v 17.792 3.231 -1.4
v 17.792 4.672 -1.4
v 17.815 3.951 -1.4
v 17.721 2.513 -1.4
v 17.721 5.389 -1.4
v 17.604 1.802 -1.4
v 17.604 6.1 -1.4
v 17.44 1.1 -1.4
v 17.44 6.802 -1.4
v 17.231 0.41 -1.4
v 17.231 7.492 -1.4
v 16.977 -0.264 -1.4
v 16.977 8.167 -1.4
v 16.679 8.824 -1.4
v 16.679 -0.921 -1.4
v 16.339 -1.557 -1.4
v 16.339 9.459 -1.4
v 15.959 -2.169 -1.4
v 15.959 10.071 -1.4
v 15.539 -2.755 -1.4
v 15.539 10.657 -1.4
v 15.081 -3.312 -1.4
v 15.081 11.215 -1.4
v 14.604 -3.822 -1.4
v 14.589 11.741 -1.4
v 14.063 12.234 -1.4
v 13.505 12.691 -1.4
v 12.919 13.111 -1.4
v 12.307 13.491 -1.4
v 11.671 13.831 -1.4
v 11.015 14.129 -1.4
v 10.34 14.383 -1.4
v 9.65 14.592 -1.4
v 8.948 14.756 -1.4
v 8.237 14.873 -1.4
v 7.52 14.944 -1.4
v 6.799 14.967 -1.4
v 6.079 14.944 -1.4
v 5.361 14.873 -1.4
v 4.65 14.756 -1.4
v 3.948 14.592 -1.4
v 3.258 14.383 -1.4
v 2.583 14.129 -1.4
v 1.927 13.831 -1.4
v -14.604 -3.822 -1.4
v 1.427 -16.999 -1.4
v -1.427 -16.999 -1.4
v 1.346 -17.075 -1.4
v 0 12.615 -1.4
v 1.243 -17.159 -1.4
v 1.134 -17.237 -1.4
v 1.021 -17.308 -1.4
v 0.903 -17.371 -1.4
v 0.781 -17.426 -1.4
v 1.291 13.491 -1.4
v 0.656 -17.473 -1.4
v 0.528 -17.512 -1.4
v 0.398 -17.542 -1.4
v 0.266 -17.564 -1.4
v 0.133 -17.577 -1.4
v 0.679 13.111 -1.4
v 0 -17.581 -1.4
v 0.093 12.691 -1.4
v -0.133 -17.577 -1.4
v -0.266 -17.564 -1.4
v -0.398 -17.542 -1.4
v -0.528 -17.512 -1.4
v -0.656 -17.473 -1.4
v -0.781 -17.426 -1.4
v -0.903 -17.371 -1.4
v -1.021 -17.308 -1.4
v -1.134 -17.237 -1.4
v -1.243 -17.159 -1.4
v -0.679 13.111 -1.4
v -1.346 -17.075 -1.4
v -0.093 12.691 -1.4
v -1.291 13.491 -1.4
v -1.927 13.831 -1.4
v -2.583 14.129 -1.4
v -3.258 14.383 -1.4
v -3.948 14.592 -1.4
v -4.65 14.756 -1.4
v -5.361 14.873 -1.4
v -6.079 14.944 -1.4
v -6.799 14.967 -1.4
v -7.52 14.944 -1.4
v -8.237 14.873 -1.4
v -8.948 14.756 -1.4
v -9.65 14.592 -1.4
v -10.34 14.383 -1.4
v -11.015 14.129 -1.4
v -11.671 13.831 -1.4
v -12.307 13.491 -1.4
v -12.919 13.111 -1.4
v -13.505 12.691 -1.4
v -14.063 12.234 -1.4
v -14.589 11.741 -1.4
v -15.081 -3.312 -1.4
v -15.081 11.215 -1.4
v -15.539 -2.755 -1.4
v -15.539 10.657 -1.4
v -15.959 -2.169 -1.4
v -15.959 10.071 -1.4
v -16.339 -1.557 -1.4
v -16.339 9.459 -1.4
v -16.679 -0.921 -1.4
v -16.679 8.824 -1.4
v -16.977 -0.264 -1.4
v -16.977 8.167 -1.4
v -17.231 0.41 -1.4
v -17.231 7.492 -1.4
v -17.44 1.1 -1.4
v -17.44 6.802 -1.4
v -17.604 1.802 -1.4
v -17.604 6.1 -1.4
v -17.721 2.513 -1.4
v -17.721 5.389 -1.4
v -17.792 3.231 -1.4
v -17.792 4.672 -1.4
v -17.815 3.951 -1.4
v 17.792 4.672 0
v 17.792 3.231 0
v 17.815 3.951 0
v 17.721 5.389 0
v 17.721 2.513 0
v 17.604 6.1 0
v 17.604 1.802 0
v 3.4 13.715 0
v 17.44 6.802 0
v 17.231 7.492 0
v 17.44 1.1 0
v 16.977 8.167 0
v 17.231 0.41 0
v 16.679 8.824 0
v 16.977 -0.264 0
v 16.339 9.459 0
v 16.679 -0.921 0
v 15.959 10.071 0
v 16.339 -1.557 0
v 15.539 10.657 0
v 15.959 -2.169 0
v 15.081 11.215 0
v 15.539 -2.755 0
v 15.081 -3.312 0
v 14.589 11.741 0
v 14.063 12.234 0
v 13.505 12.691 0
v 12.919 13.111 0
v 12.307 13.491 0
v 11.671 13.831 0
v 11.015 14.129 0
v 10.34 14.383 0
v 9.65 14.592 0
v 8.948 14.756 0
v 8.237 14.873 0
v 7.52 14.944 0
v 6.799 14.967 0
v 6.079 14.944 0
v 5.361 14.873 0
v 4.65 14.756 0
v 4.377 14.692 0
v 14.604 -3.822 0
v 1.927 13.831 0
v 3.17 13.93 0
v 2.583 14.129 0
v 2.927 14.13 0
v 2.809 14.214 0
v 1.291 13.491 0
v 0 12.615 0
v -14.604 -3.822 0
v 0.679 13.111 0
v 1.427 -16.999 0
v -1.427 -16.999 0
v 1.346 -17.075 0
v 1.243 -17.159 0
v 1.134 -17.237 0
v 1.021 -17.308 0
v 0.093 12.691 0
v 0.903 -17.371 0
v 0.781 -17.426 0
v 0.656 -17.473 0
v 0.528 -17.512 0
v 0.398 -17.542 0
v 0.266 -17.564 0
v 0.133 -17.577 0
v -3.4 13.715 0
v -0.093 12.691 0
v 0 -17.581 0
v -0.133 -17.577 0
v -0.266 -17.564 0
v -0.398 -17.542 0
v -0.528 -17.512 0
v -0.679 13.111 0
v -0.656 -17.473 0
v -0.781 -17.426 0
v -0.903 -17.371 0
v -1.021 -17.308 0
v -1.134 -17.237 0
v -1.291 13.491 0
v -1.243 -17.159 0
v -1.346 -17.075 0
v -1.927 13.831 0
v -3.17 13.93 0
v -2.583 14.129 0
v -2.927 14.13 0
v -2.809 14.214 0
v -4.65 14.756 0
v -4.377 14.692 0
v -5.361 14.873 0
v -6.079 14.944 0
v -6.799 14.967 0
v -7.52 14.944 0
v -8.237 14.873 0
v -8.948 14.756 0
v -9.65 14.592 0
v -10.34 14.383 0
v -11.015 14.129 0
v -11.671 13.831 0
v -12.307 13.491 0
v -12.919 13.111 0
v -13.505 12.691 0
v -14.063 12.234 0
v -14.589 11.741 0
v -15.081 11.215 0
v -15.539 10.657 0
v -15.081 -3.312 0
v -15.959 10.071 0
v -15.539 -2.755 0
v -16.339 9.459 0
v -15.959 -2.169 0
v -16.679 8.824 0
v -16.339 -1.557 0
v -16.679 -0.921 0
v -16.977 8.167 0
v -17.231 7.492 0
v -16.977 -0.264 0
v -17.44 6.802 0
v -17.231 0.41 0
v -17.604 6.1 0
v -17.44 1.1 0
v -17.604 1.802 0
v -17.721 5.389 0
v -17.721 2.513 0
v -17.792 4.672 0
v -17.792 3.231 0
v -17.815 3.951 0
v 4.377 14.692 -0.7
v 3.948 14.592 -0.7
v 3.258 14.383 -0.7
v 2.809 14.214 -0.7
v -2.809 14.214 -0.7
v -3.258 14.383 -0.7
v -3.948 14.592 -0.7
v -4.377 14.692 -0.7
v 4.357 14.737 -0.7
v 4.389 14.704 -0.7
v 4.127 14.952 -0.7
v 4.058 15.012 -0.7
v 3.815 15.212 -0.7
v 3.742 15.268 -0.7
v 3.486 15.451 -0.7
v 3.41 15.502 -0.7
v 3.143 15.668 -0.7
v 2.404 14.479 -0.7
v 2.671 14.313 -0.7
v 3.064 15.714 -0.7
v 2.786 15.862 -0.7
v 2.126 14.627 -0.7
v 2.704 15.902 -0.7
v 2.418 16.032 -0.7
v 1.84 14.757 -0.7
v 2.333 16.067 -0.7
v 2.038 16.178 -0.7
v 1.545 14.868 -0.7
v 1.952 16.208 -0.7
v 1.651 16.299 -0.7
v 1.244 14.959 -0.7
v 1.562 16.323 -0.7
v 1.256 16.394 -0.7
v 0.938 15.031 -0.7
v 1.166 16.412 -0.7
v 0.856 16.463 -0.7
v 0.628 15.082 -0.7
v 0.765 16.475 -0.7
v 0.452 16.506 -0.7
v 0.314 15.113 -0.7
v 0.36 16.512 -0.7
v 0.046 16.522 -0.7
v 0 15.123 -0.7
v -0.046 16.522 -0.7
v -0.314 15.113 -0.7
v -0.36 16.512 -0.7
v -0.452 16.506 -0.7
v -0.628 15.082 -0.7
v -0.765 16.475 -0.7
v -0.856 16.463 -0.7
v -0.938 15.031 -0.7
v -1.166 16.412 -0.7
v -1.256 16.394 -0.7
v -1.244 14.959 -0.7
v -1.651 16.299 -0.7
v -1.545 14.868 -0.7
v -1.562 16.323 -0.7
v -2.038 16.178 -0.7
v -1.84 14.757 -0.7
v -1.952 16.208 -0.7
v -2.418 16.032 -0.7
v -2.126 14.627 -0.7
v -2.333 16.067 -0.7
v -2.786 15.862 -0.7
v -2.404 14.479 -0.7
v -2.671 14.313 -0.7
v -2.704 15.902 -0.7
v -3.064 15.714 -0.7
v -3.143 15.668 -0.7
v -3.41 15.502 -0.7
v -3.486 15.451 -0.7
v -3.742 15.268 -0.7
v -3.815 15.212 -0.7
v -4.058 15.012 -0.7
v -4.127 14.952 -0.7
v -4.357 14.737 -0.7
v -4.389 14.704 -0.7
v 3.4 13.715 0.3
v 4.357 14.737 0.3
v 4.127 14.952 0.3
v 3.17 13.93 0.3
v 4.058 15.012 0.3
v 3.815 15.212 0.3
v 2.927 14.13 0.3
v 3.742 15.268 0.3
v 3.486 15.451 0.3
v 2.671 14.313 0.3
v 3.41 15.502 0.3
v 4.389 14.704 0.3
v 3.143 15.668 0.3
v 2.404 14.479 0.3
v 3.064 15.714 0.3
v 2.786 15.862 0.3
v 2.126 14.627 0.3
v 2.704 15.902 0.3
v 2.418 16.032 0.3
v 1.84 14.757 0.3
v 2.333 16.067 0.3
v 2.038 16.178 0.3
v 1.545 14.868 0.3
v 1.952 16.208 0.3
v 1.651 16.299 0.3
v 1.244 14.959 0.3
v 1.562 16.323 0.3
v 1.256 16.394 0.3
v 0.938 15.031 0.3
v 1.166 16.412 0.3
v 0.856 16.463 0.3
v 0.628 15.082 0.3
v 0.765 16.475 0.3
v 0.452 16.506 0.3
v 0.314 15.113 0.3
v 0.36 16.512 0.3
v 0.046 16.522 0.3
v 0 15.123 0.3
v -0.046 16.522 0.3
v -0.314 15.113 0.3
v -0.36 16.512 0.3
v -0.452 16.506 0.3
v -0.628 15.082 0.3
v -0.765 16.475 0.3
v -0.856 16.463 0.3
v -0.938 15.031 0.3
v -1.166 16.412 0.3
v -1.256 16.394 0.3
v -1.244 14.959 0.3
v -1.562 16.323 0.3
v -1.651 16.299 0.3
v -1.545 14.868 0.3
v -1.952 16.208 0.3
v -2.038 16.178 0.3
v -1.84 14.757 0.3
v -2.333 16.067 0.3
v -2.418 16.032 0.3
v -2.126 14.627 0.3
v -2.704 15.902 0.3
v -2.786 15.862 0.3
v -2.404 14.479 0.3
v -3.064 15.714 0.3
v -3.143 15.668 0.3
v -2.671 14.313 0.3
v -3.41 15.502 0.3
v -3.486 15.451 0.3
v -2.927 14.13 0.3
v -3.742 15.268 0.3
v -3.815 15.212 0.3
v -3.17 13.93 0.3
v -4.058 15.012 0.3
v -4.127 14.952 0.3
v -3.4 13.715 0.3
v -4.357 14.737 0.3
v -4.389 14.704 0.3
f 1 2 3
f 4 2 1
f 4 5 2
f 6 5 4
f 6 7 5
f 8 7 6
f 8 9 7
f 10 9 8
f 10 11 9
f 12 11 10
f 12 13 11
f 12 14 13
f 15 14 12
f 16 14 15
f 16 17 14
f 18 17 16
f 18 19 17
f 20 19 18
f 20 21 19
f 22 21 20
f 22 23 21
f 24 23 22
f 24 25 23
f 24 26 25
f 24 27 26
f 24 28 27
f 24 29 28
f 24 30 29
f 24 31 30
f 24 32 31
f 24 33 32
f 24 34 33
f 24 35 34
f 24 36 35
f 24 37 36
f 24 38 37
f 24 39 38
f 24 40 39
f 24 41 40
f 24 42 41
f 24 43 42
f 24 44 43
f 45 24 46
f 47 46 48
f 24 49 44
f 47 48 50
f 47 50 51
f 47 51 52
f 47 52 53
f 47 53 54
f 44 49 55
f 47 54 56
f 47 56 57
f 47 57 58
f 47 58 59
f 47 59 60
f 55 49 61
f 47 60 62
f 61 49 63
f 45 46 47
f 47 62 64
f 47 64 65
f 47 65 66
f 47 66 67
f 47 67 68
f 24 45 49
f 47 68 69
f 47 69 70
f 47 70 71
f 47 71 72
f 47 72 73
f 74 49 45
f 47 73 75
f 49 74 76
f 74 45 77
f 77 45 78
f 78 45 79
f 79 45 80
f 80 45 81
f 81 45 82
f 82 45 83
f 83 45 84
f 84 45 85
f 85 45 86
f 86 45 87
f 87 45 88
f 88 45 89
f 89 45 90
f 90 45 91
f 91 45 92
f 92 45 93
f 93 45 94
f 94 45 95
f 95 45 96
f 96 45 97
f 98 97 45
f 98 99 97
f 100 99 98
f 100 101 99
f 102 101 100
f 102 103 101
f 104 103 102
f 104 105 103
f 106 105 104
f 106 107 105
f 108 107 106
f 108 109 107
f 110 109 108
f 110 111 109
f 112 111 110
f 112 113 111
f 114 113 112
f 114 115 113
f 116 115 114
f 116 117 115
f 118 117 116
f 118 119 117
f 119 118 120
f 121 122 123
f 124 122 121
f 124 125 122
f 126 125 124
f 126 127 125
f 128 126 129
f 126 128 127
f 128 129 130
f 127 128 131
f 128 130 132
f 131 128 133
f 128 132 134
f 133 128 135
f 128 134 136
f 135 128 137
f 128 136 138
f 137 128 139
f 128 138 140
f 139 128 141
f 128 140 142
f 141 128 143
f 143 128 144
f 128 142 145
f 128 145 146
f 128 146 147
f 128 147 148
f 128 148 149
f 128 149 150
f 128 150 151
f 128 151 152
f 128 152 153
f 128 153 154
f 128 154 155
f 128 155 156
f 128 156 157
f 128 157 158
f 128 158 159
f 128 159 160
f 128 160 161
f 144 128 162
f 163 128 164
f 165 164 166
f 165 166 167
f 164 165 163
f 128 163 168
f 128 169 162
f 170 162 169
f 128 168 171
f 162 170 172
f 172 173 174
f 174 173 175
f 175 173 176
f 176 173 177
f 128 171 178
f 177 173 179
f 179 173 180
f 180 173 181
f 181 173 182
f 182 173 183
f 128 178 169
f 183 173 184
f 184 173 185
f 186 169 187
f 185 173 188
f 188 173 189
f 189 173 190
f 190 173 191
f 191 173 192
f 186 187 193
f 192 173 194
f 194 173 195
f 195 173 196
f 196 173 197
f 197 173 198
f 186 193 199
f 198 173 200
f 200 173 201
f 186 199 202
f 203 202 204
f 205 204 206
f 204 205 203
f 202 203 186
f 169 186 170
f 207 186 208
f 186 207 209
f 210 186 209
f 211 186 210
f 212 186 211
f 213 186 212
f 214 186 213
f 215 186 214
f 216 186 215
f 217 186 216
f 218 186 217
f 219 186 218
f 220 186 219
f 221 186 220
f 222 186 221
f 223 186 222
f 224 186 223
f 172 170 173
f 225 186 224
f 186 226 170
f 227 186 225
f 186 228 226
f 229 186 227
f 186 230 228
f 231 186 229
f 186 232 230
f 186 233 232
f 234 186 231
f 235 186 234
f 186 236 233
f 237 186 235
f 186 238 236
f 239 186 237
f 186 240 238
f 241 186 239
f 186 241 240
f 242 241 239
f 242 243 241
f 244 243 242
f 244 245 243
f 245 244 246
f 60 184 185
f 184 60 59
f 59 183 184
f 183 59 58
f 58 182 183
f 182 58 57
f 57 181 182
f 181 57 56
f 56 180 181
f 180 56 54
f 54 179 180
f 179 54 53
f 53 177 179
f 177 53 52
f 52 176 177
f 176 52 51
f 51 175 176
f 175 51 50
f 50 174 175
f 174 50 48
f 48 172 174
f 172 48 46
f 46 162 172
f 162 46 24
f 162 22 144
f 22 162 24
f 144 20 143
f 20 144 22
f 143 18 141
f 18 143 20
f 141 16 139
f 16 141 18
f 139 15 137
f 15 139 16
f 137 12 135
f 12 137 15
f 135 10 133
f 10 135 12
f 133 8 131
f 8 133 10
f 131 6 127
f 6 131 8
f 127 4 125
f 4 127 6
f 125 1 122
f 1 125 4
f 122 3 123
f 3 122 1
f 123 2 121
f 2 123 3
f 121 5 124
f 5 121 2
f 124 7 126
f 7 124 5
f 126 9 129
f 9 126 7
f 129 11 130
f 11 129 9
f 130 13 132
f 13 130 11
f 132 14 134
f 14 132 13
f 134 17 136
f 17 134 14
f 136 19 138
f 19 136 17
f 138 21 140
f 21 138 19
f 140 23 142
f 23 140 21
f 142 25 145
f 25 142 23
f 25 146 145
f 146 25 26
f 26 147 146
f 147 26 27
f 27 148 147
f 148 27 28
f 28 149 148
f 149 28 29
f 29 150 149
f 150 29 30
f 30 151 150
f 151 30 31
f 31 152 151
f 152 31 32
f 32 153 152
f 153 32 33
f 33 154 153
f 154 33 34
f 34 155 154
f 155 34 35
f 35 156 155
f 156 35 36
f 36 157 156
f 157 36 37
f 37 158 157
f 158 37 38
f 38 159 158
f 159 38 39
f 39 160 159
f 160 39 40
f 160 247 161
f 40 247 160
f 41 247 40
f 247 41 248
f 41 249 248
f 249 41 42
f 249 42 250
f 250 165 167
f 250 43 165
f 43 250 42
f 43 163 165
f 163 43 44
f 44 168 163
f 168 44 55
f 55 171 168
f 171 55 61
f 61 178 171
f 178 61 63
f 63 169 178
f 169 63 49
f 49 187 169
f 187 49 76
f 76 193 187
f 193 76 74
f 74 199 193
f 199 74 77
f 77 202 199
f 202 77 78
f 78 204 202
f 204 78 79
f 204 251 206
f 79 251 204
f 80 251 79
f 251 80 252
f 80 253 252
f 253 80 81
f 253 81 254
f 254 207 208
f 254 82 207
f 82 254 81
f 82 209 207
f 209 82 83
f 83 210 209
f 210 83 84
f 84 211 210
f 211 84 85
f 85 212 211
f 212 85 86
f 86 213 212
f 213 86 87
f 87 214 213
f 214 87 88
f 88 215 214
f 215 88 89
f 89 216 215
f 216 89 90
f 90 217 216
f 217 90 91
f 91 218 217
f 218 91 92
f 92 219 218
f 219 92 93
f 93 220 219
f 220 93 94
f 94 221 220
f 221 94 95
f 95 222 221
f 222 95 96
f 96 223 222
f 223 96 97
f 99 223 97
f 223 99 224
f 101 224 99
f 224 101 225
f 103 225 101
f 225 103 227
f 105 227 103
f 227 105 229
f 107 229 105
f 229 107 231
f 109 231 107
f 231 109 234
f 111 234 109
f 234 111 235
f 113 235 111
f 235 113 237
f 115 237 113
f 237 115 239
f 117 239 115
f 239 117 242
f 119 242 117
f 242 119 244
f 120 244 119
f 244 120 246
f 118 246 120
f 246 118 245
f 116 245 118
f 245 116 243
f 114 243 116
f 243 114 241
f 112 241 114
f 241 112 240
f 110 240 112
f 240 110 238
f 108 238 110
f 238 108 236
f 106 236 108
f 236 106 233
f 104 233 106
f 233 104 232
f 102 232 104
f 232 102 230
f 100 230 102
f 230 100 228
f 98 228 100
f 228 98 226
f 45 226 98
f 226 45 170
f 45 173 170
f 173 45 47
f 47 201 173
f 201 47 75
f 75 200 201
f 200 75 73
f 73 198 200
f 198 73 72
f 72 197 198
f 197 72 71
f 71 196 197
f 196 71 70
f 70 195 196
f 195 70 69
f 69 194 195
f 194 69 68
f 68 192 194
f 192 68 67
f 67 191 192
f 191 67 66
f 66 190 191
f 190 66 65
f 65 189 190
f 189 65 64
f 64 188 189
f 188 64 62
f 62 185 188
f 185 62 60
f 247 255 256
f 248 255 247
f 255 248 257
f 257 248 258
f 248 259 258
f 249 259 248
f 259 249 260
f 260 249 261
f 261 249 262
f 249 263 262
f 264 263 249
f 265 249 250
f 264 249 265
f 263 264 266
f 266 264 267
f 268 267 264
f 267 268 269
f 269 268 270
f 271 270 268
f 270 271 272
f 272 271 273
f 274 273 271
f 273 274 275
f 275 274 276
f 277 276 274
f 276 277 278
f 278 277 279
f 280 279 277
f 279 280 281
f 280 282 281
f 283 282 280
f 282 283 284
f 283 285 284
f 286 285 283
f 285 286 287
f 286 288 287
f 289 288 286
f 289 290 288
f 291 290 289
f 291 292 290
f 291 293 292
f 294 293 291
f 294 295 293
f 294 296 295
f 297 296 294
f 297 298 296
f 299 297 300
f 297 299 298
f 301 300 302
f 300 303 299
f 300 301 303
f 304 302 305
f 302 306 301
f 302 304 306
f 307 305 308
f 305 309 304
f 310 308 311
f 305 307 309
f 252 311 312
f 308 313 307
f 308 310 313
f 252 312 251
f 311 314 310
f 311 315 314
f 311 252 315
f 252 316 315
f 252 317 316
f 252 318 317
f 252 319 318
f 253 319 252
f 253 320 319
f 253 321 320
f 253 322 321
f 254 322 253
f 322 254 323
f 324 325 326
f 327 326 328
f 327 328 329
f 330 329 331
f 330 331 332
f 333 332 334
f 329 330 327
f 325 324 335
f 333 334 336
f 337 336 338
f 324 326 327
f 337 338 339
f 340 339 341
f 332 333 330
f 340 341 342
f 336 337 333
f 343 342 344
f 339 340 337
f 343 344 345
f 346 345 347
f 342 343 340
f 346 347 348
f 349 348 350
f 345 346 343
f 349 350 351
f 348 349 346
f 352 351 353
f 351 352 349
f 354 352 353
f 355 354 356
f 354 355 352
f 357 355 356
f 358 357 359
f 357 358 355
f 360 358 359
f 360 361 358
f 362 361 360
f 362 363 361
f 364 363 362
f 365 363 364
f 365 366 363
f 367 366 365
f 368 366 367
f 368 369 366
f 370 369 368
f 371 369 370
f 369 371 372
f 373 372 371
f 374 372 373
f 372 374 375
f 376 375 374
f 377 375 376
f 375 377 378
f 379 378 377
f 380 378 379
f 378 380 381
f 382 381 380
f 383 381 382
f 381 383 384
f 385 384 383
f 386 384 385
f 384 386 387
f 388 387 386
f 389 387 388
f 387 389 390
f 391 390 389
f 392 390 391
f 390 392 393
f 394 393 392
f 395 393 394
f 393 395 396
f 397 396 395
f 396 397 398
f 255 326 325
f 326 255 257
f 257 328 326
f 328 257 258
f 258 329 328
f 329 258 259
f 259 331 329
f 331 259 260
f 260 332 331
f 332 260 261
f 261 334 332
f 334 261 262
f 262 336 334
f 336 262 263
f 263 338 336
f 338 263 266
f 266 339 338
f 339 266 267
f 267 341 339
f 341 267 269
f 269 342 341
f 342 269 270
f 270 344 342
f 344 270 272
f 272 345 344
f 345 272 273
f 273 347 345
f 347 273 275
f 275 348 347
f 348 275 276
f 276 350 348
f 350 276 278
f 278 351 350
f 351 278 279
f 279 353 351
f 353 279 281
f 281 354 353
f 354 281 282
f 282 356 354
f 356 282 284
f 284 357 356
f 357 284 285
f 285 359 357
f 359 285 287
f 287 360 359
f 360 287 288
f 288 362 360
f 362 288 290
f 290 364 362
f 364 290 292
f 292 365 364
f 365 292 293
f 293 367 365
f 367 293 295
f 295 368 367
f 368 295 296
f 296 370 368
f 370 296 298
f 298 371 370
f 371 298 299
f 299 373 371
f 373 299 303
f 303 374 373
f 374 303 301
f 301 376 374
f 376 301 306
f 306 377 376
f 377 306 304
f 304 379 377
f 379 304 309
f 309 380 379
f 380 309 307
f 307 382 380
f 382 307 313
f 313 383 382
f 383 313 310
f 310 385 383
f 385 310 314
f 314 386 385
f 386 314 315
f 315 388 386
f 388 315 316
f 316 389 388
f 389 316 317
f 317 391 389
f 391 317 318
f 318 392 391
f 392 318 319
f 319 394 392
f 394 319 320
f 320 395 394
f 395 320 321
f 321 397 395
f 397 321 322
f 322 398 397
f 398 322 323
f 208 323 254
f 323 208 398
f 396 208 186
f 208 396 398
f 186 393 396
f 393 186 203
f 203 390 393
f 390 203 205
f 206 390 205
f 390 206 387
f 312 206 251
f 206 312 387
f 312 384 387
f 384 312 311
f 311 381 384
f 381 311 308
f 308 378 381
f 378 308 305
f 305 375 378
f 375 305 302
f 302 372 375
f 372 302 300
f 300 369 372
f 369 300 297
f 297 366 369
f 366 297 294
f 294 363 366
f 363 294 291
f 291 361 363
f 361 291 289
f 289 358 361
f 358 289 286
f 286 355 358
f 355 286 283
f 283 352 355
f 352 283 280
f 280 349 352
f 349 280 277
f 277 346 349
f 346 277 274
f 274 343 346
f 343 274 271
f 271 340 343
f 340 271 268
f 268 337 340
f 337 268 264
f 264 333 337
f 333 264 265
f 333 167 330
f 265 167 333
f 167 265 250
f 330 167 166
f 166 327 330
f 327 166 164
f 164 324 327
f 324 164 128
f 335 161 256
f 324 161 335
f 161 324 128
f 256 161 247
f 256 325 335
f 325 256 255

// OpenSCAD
// file: random_maze_generator.scad
use <2d.scad>;

rows = 10; 
columns = 10; 
wall_thickness = 2;
wall_height = 5;
block_width = 5;
bottom = YES;


/*
 * constants, for clearness
 *
 */
 
// random directions, for picking up a direction to visit the next block
function PERMUTATION_OF_FOUR() = [
    [1, 2, 3, 4],
    [1, 2, 4, 3],
    [1, 3, 2, 4],
    [1, 3, 4, 2],
    [1, 4, 2, 3],
    [1, 4, 3, 2],
    [2, 1, 3, 4],
    [2, 1, 4, 3],
    [2, 3, 1, 4],
    [2, 3, 4, 1],
    [2, 4, 1, 3],
    [2, 4, 3, 1],
    [3, 1, 2, 4],
    [3, 1, 4, 2],
    [3, 2, 1, 4],
    [3, 2, 4, 1],
    [3, 4, 1, 2],
    [3, 4, 2, 1],
    [4, 1, 2, 3],
    [4, 1, 3, 2],
    [4, 2, 1, 3],
    [4, 2, 3, 1],
    [4, 3, 1, 2],
    [4, 3, 2, 1]
];

function NO_WALL() = 0;
function UP_WALL() = 1;
function RIGHT_WALL() = 2;
function UP_RIGHT_WALL() = 3;

function NOT_VISITED() = 0;
function VISITED() = 1;

/* 
 * modules for creating a maze
 *
 */

// create the outer wall of maze
module maze_outer_wall(rows, columns, block_width = 5, wall_thickness = 1) {
    x_line([0, rows * block_width], columns * block_width, wall_thickness);
    y_line([0, block_width], (rows - 1) * block_width, wall_thickness);
}

// create the inner wall of maze
module maze_inner_wall(maze, block_width = 5, wall_thickness = 1) {
    for(i = [0:len(maze) - 1]) {
        cord = maze[i];
        x = (cord[0] - 1) * block_width;
        y = (cord[1] - 1) * block_width;
        v = cord[3];
        
        if(v == 1 || v == 3) {
            x_line([x, y], block_width, wall_thickness);
        }
        if(v == 2 || v == 3) {
            y_line([x + block_width, y], block_width, wall_thickness);
        }
    }  
}

// create a maze
module maze(rows, columns, maze_vector, block_width = 5, wall_thickness = 1) {
     maze_outer_wall(rows, columns, block_width, wall_thickness);
     maze_inner_wall(maze_vector, block_width, wall_thickness);
}

/* 
 * utilities functions
 *
 */

// comare the equality of [x1, y1] and [x2, y2]
function cord_equals(cord1, cord2) = cord1 == cord2;

// is the point visited?
function not_visited(cord, vs, index = 0) =
    index == len(vs) ? true : 
        (cord_equals([vs[index][0], vs[index][1]], cord) && vs[index][2] == 1 ? false :
            not_visited(cord, vs, index + 1));
            
// pick a direction randomly
function rand_dirs() =
    PERMUTATION_OF_FOUR()[round(rands(0, 24, 1)[0])]; 

// give a index (exclusivly), slice a vector 
function head_to(i, vs) =
    i >= len(vs) ? vs : (
        i == 0 ? [] : concat(head_to(i - 1, vs), [vs[i - 1]])
    );

// give a index (exclusivly), slice a vector 
function tail_from(i, vs, index = 0, new_vs = []) =
    i >= len(vs) ? [] : (
        index < i ? tail_from(i, vs, index + 1) : (
            index < len(vs) ? tail_from(i, vs, index + 1, concat(new_vs, [vs[index]])) : new_vs
        )
    );

// replace v1 in the vector with v2 
function replace(v1, v2, vs, index = 0) =
    index == len(vs) ? vs : (
        vs[index] == v1 ? concat(concat(head_to(index, vs), [v2]), tail_from(index + 1, vs)) : replace(v1, v2, vs, index + 1)
    );
    
/* 
 * functions for generating a maze vector
 *
 */

// initialize rows of a maze
function init_row(n, length) =
    length == 0 ? [] : concat(init_row(n, length - 1), [[length, n, 0, UP_RIGHT_WALL()]]);
    
// initialize a maze
function init_maze(rows, columns) =
    rows == 0 ? [] : concat(init_maze(rows - 1, columns), init_row(rows, columns));
    
// find a vector in the maze vector
function find(i, j, maze_vector, index = 0) =
    index == len(maze_vector) ? [] : (
        cord_equals([i, j], [maze_vector[index][0], maze_vector[index][1]]) ? maze_vector[index] : find(i, j, maze_vector, index + 1)
    );

////
// NO_WALL = 0;
// UP_WALL = 1;
// RIGHT_WALL = 2;
// UP_RIGHT_WALL = 3;
function delete_right_wall(original_block) = 
    original_block == NO_WALL() || original_block == RIGHT_WALL() ? NO_WALL() : UP_WALL();

function delete_up_wall(original_block) = 
    (original_block == NO_WALL() || original_block == UP_WALL()) ? NO_WALL() : RIGHT_WALL();
    
function delete_right_wall_of(vs, is_visited, maze_vector) =
    replace(vs, [vs[0], vs[1] , is_visited, delete_right_wall(vs[3])] ,maze_vector);

function delete_up_wall_of(vs, is_visited, maze_vector) =
    replace(vs, [vs[0], vs[1] , is_visited, delete_up_wall(vs[3])] ,maze_vector);

function go_right(i, j, rows, columns, maze_vector) =
    go_maze(i + 1, j, rows, columns, delete_right_wall_of(find(i, j, maze_vector), VISITED(), maze_vector));
    
function go_up(i, j, rows, columns, maze_vector) =
    go_maze(i, j - 1, rows, columns, delete_up_wall_of(find(i, j, maze_vector), VISITED(), maze_vector));
    
function visit(v, maze_vector) =
    replace(v, [v[0], v[1], VISITED(), v[3]], maze_vector);
 
function go_left(i, j, rows, columns, maze_vector) =
    go_maze(i - 1, j, rows, columns, delete_right_wall_of(find(i - 1, j, maze_vector), NOT_VISITED(), maze_vector));
    
function go_down(i, j, rows, columns, maze_vector) =
    go_maze(i, j + 1, rows, columns, delete_up_wall_of(find(i, j + 1, maze_vector), NOT_VISITED(), maze_vector));
    
function go_maze(i, j, rows, columns, maze_vector) =
    look_around(i, j, rand_dirs(), rows, columns, visit(find(i, j, maze_vector), maze_vector));
    
function look_around(i, j, dirs, rows, columns, maze_vector, index = 0) =
    index == 4 ? maze_vector : 
        look_around( 
            i, j, dirs, 
            rows, columns, 
            build_wall(i, j, dirs[index], rows, columns, maze_vector), 
            index + 1
        ); 

function build_wall(i, j, n, rows, columns, maze_vector) = 
    n == 1 && i != columns && not_visited([i + 1, j], maze_vector) ? go_right(i, j, rows, columns, maze_vector) : ( 
        n == 2 && j != 1 && not_visited([i, j - 1], maze_vector) ? go_up(i, j, rows, columns, maze_vector)  : (
            n == 3 && i != 1 && not_visited([i - 1, j], maze_vector) ? go_left(i, j,rows, columns,  maze_vector)  : (
                n == 4 && j != rows && not_visited([i, j + 1], maze_vector) ? go_down(i, j, rows, columns, maze_vector) : maze_vector
            ) 
        )
    ); 
 
/*
 * create a maze
 *
 */
maze_vector = go_maze(1, 1, rows, columns, replace([columns, rows, 0, UP_RIGHT_WALL()], [columns, rows, 0, UP_WALL()], init_maze(rows, columns)));
linear_extrude(wall_height) 
    maze(rows, columns, maze_vector, block_width, wall_thickness);
	
if(bottom == "YES") {
    translate([-wall_thickness / 2, -wall_thickness / 2, -wall_thickness]) 
	    linear_extrude(wall_thickness) square([block_width * columns + wall_thickness, block_width * rows + wall_thickness]);
}	
// file: 2d.scad
function PI() = 3.14159;

// give a [x, y] point and length. draw a line in the x direction
module x_line(point, length, thickness = 1) {
    offset = thickness / 2;
    translate([point[0] - offset, point[1] - offset, 0]) 
        square([length + thickness, thickness]);
}

// give a [x, y] point and length. draw a line in the y direction
module y_line(point, length, thickness = 1) {
    offset = thickness / 2;
    translate([point[0] - offset, point[1] - offset, 0])  
        square([thickness, length + thickness]);
}

module a_quarter_arc(radius, angle, width = 1) {
    outer = radius + width;
    intersection() {
        difference() {
            offset(r = width) circle(radius, $fn=96); 
            circle(radius, $fn=96);
        }
        polygon([[0, 0], [outer, 0], [outer, outer * sin(angle)], [outer * cos(angle), outer * sin(angle)]]);
    }
}

module arc(radius, angles, width = 1) {
    angle_from = angles[0];
    angle_to = angles[1];
    angle_difference = angle_to - angle_from;
    outer = radius + width;
    rotate(angle_from)
        if(angle_difference <= 90) {
            a_quarter_arc(radius, angle_difference, width);
        } else if(angle_difference > 90 && angle_difference <= 180) {
            arc(radius, [0, 90], width);
            rotate(90) a_quarter_arc(radius, angle_difference - 90, width);
        } else if(angle_difference > 180 && angle_difference <= 270) {
            arc(radius, [0, 180], width);
            rotate(180) a_quarter_arc(radius, angle_difference - 180, width);
        } else if(angle_difference > 270 && angle_difference <= 360) {
            arc(radius, [0, 270], width);
            rotate(270) a_quarter_arc(radius, angle_difference - 270, width);
       }
}




// create a equilateral triangle
module equilateral_triangle(side_length, center = false) {
    radius = 0.57735026918962576450914878050196 * side_length;
	circle(r = radius, center = center, $fn = 3); 
}

// create a holly equilateral triangle
module holly_equilateral_triangle(side_length, thickness = 1, center = true) {
    difference() {
	    offset(delta = thickness) equilateral_triangle(side_length, center = center);
	    equilateral_triangle(side_length, center = center);
    }
}

module a_quarter_sector(radius, angle) {
    intersection() {
        circle(radius, $fn=96);
        
        polygon([[0, 0], [radius, 0], [radius, radius * sin(angle)], [radius * cos(angle), radius * sin(angle)]]);
    }
}

module sector(radius, angles) {
    angle_from = angles[0];
    angle_to = angles[1];
    angle_difference = angle_to - angle_from;

    rotate(angle_from)
        if(angle_difference <= 90) {
            a_quarter_sector(radius, angle_difference);
        } else if(angle_difference > 90 && angle_difference <= 180) {
            sector(radius, [0, 90]);
            rotate(90) a_quarter_sector(radius, angle_difference - 90);
        } else if(angle_difference > 180 && angle_difference <= 270) {
            sector(radius, [0, 180]);
            rotate(180) a_quarter_sector(radius, angle_difference - 180);
        } else if(angle_difference > 270 && angle_difference <= 360) {
            sector(radius, [0, 270]);
            rotate(270) a_quarter_sector(radius, angle_difference - 270);
       }
}

// The heart is composed of two semi-circles and two isosceles triangles. 
// The triangle's two equal sides have length equals to the double `radius` of the circle.
// That's why the `solid_heart` module is drawn according a `radius` parameter.
module solid_heart(radius, tip_factor) {
    offset_h = 2.2360679774997896964091736687313 * radius / 2 - radius * sin(45);
	tip_radius = radius / tip_factor;
	
    translate([radius * cos(45), offset_h, 0]) rotate([0, 0, -45])
    hull() {
        circle(radius, $fn = 96);
		translate([radius - tip_radius, -radius * 2 + tip_radius, 0]) 
		    circle(tip_radius, center = true, $fn = 96);
	}
	
	translate([-radius * cos(45), offset_h, 0]) rotate([0, 0, 45]) hull() {
        circle(radius, $fn = 96);
		translate([-radius + tip_radius, -radius * 2 + tip_radius, 0]) 
		    circle(tip_radius, center = true, $fn = 96);
	}
}

module ring_heart(radius, tip_factor, thickness) {
    difference() { 
	    offset(delta = thickness) solid_heart(radius, tip_factor);
        solid_heart(radius, tip_factor);
	}
}
// main file
use <2d.scad>;
use <random_maze_generator.scad>;

heart_height = 30;
wall_thickness = 1.4;
wall_height = 1;
cblocks = 10;
levels = 3;
tip_factor = 15;
bottom = "YES";
ring = "YES";  

// give a [x, y] point and length. draw a line in the x direction
module x_line(point, length, thickness = 1) {
    offset = thickness / 2;
    translate([point[0] - offset, point[1] - offset, 0]) 
        square([length + thickness, thickness]);
}


module a_quarter_arc(radius, angle, width = 1) {
    outer = radius + width;
    intersection() {
        difference() {
            offset(r = width) circle(radius, $fn=96); 
            circle(radius, $fn=96);
        }
        polygon([[0, 0], [outer, 0], [outer, outer * sin(angle)], [outer * cos(angle), outer * sin(angle)]]);
    }
}

module arc(radius, angles, width = 1) {
    angle_from = angles[0];
    angle_to = angles[1];
    angle_difference = angle_to - angle_from;
    outer = radius + width;
    rotate(angle_from)
        if(angle_difference <= 90) {
            a_quarter_arc(radius, angle_difference, width);
        } else if(angle_difference > 90 && angle_difference <= 180) {
            arc(radius, [0, 90], width);
            rotate(90) a_quarter_arc(radius, angle_difference - 90, width);
        } else if(angle_difference > 180 && angle_difference <= 270) {
            arc(radius, [0, 180], width);
            rotate(180) a_quarter_arc(radius, angle_difference - 180, width);
        } else if(angle_difference > 270 && angle_difference <= 360) {
            arc(radius, [0, 270], width);
            rotate(270) a_quarter_arc(radius, angle_difference - 270, width);
       }
}

/*
 * constants, for clearness
 *
 */
 
// random directions, for picking up a direction to visit the next block
function PERMUTATION_OF_FOUR() = [
    [1, 2, 3, 4],
    [1, 2, 4, 3],
    [1, 3, 2, 4],
    [1, 3, 4, 2],
    [1, 4, 2, 3],
    [1, 4, 3, 2],
    [2, 1, 3, 4],
    [2, 1, 4, 3],
    [2, 3, 1, 4],
    [2, 3, 4, 1],
    [2, 4, 1, 3],
    [2, 4, 3, 1],
    [3, 1, 2, 4],
    [3, 1, 4, 2],
    [3, 2, 1, 4],
    [3, 2, 4, 1],
    [3, 4, 1, 2],
    [3, 4, 2, 1],
    [4, 1, 2, 3],
    [4, 1, 3, 2],
    [4, 2, 1, 3],
    [4, 2, 3, 1],
    [4, 3, 1, 2],
    [4, 3, 2, 1]
];

function NO_WALL() = 0;
function UP_WALL() = 1;
function RIGHT_WALL() = 2;
function UP_RIGHT_WALL() = 3;

function NOT_VISITED() = 0;
function VISITED() = 1;

/* 
 * utilities functions
 *
 */

// comare the equality of [x1, y1] and [x2, y2]
function cord_equals(cord1, cord2) = cord1 == cord2;

// is the point visited?
function not_visited(cord, vs, index = 0) =
    index == len(vs) ? true : 
        (cord_equals([vs[index][0], vs[index][1]], cord) && vs[index][2] == 1 ? false :
            not_visited(cord, vs, index + 1));
            
// pick a direction randomly
function rand_dirs() =
    PERMUTATION_OF_FOUR()[round(rands(0, 24, 1)[0])]; 

// give a index (exclusivly), slice a vector 
function head_to(i, vs) =
    i >= len(vs) ? vs : (
        i == 0 ? [] : concat(head_to(i - 1, vs), [vs[i - 1]])
    );

// give a index (exclusivly), slice a vector 
function tail_from(i, vs, index = 0, new_vs = []) =
    i >= len(vs) ? [] : (
        index < i ? tail_from(i, vs, index + 1) : (
            index < len(vs) ? tail_from(i, vs, index + 1, concat(new_vs, [vs[index]])) : new_vs
        )
    );

// replace v1 in the vector with v2 
function replace(v1, v2, vs, index = 0) =
    index == len(vs) ? vs : (
        vs[index] == v1 ? concat(concat(head_to(index, vs), [v2]), tail_from(index + 1, vs)) : replace(v1, v2, vs, index + 1)
    );
    
/* 
 * functions for generating a maze vector
 *
 */

// initialize rows of a maze
function init_row(n, length) =
    length == 0 ? [] : concat(init_row(n, length - 1), [[length, n, 0, UP_RIGHT_WALL()]]);
    
// initialize a maze
function init_maze(rows, columns) =
    rows == 0 ? [] : concat(init_maze(rows - 1, columns), init_row(rows, columns));
    
// find a vector in the maze vector
function find(i, j, maze_vector, index = 0) =
    index == len(maze_vector) ? [] : (
        cord_equals([i, j], [maze_vector[index][0], maze_vector[index][1]]) ? maze_vector[index] : find(i, j, maze_vector, index + 1)
    );

////
// NO_WALL = 0;
// UP_WALL = 1;
// RIGHT_WALL = 2;
// UP_RIGHT_WALL = 3;
function delete_right_wall(original_block) = 
    original_block == NO_WALL() || original_block == RIGHT_WALL() ? NO_WALL() : UP_WALL();

function delete_up_wall(original_block) = 
    (original_block == NO_WALL() || original_block == UP_WALL()) ? NO_WALL() : RIGHT_WALL();
    
function delete_right_wall_of(vs, is_visited, maze_vector) =
    replace(vs, [vs[0], vs[1] , is_visited, delete_right_wall(vs[3])] ,maze_vector);

function delete_up_wall_of(vs, is_visited, maze_vector) =
    replace(vs, [vs[0], vs[1] , is_visited, delete_up_wall(vs[3])] ,maze_vector);

function go_right(i, j, rows, columns, maze_vector) =
    go_maze(i + 1, j, rows, columns, delete_right_wall_of(find(i, j, maze_vector), VISITED(), maze_vector));
    
function go_up(i, j, rows, columns, maze_vector) =
    go_maze(i, j - 1, rows, columns, delete_up_wall_of(find(i, j, maze_vector), VISITED(), maze_vector));
    
function visit(v, maze_vector) =
    replace(v, [v[0], v[1], VISITED(), v[3]], maze_vector);
 
function go_left(i, j, rows, columns, maze_vector) =
    go_maze(i - 1, j, rows, columns, delete_right_wall_of(find(i - 1, j, maze_vector), NOT_VISITED(), maze_vector));
    
function go_down(i, j, rows, columns, maze_vector) =
    go_maze(i, j + 1, rows, columns, delete_up_wall_of(find(i, j + 1, maze_vector), NOT_VISITED(), maze_vector));
    
function go_maze(i, j, rows, columns, maze_vector) =
    look_around(i, j, rand_dirs(), rows, columns, visit(find(i, j, maze_vector), maze_vector));
    
function look_around(i, j, dirs, rows, columns, maze_vector, index = 0) =
    index == 4 ? maze_vector : 
        look_around( 
            i, j, dirs, 
            rows, columns, 
            build_wall(i, j, dirs[index], rows, columns, maze_vector), 
            index + 1
        ); 

function build_wall(i, j, n, rows, columns, maze_vector) = 
    n == 1 && i != columns && not_visited([i + 1, j], maze_vector) ? go_right(i, j, rows, columns, maze_vector) : ( 
        n == 2 && j != 1 && not_visited([i, j - 1], maze_vector) ? go_up(i, j, rows, columns, maze_vector)  : (
            n == 3 && i != 1 && not_visited([i - 1, j], maze_vector) ? go_left(i, j,rows, columns,  maze_vector)  : (
                n == 4 && j != rows && not_visited([i, j + 1], maze_vector) ? go_down(i, j, rows, columns, maze_vector) : maze_vector
            ) 
        )
    ); 

module a_quarter_sector(radius, angle) {
    intersection() {
        circle(radius, $fn=96);
        
        polygon([[0, 0], [radius, 0], [radius, radius * sin(angle)], [radius * cos(angle), radius * sin(angle)]]);
    }
}

module sector(radius, angles) {
    angle_from = angles[0];
    angle_to = angles[1];
    angle_difference = angle_to - angle_from;

    rotate(angle_from)
        if(angle_difference <= 90) {
            a_quarter_sector(radius, angle_difference);
        } else if(angle_difference > 90 && angle_difference <= 180) {
            sector(radius, [0, 90]);
            rotate(90) a_quarter_sector(radius, angle_difference - 90);
        } else if(angle_difference > 180 && angle_difference <= 270) {
            sector(radius, [0, 180]);
            rotate(180) a_quarter_sector(radius, angle_difference - 180);
        } else if(angle_difference > 270 && angle_difference <= 360) {
            sector(radius, [0, 270]);
            rotate(270) a_quarter_sector(radius, angle_difference - 270);
       }
}

module ring_heart_sector(radius, angle, tip_factor, thickness) {
	intersection() {
		ring_heart(radius - 0.1, tip_factor, thickness + 0.2);
		rotate([0, 0, angle]) x_line([0, 0], radius * 3, thickness);
	}
}

module heart_to_heart_wall(radius, length, angle, tip_factor, thickness) {
    intersection() {
        difference() {
            solid_heart(radius + length, tip_factor);
		    solid_heart(radius, tip_factor);
	    }
	    rotate([0, 0, angle]) 
		    x_line([0, 0], (radius + length) * 2, thickness);
	}
}

module heart_maze(radius, cblocks, levels, tip_factor, height = 1, thickness = 1) {
    full_circle_angle = 360;
    arc_angle = full_circle_angle / cblocks;
	r = radius / (levels + 1);
	
	maze = go_maze(1, 1, cblocks, levels, replace([levels, cblocks - 1, 0, UP_RIGHT_WALL()], [levels, cblocks - 1, 0, UP_WALL()], init_maze(cblocks, levels)));
	
	
	difference() {
		linear_extrude(height) union() {
			for(i = [1 : levels + 1]) {
				ring_heart(r * i, tip_factor, thickness);
			}
		  
		  
			for(i = [0:len(maze) - 1]) { 
				cord = maze[i];
				cr = cord[0]; 
				cc = cord[1] - 1;    
				v = cord[3];
				
				angle = cc * arc_angle;
				 
				if(v == 1 || v == 3) { 
					heart_to_heart_wall(r * cr, r, cc * arc_angle + 90, tip_factor, thickness);
				} 
			}
	    }
		
		
		linear_extrude(height) union() {
		    // maze entry
		    ring_heart_sector(r, 1.5 * arc_angle + 90, tip_factor, thickness);

	        // road to the next level
			for(i = [0:len(maze) - 1]) { 
				cord = maze[i];
				cr = cord[0]; 
				cc = cord[1] - 1;    
				v = cord[3];
				
				if(v == 0 || v == 1) {
					ring_heart_sector(r * (cr + 1), (cc + 0.5) * arc_angle + 90, tip_factor, thickness);
				}  
			}
		}
	}
}

heart_maze(heart_height / 3.12, cblocks, levels, tip_factor, wall_height, wall_thickness);

if(bottom == "YES") {
    translate([0, 0, -wall_thickness]) 
	    linear_extrude(wall_thickness) 
		    offset(delta = wall_thickness) 
			    solid_heart(heart_height / 3.12, tip_factor, wall_thickness);
}

if(ring == "YES") {
    if(bottom == "YES")  {
	    translate([0, heart_height / 3.12 +  wall_thickness / 2, -wall_thickness / 2]) 
			linear_extrude(wall_height) 
				arc(heart_height / 3.12 / 2, [45, 135], wall_thickness);
	} else {
	    translate([0, heart_height / 3.12 + wall_thickness / 2, 0]) 
			linear_extrude(wall_height) 
				arc(heart_height / 3.12 / 2, [45, 135], wall_thickness);
	}
}
